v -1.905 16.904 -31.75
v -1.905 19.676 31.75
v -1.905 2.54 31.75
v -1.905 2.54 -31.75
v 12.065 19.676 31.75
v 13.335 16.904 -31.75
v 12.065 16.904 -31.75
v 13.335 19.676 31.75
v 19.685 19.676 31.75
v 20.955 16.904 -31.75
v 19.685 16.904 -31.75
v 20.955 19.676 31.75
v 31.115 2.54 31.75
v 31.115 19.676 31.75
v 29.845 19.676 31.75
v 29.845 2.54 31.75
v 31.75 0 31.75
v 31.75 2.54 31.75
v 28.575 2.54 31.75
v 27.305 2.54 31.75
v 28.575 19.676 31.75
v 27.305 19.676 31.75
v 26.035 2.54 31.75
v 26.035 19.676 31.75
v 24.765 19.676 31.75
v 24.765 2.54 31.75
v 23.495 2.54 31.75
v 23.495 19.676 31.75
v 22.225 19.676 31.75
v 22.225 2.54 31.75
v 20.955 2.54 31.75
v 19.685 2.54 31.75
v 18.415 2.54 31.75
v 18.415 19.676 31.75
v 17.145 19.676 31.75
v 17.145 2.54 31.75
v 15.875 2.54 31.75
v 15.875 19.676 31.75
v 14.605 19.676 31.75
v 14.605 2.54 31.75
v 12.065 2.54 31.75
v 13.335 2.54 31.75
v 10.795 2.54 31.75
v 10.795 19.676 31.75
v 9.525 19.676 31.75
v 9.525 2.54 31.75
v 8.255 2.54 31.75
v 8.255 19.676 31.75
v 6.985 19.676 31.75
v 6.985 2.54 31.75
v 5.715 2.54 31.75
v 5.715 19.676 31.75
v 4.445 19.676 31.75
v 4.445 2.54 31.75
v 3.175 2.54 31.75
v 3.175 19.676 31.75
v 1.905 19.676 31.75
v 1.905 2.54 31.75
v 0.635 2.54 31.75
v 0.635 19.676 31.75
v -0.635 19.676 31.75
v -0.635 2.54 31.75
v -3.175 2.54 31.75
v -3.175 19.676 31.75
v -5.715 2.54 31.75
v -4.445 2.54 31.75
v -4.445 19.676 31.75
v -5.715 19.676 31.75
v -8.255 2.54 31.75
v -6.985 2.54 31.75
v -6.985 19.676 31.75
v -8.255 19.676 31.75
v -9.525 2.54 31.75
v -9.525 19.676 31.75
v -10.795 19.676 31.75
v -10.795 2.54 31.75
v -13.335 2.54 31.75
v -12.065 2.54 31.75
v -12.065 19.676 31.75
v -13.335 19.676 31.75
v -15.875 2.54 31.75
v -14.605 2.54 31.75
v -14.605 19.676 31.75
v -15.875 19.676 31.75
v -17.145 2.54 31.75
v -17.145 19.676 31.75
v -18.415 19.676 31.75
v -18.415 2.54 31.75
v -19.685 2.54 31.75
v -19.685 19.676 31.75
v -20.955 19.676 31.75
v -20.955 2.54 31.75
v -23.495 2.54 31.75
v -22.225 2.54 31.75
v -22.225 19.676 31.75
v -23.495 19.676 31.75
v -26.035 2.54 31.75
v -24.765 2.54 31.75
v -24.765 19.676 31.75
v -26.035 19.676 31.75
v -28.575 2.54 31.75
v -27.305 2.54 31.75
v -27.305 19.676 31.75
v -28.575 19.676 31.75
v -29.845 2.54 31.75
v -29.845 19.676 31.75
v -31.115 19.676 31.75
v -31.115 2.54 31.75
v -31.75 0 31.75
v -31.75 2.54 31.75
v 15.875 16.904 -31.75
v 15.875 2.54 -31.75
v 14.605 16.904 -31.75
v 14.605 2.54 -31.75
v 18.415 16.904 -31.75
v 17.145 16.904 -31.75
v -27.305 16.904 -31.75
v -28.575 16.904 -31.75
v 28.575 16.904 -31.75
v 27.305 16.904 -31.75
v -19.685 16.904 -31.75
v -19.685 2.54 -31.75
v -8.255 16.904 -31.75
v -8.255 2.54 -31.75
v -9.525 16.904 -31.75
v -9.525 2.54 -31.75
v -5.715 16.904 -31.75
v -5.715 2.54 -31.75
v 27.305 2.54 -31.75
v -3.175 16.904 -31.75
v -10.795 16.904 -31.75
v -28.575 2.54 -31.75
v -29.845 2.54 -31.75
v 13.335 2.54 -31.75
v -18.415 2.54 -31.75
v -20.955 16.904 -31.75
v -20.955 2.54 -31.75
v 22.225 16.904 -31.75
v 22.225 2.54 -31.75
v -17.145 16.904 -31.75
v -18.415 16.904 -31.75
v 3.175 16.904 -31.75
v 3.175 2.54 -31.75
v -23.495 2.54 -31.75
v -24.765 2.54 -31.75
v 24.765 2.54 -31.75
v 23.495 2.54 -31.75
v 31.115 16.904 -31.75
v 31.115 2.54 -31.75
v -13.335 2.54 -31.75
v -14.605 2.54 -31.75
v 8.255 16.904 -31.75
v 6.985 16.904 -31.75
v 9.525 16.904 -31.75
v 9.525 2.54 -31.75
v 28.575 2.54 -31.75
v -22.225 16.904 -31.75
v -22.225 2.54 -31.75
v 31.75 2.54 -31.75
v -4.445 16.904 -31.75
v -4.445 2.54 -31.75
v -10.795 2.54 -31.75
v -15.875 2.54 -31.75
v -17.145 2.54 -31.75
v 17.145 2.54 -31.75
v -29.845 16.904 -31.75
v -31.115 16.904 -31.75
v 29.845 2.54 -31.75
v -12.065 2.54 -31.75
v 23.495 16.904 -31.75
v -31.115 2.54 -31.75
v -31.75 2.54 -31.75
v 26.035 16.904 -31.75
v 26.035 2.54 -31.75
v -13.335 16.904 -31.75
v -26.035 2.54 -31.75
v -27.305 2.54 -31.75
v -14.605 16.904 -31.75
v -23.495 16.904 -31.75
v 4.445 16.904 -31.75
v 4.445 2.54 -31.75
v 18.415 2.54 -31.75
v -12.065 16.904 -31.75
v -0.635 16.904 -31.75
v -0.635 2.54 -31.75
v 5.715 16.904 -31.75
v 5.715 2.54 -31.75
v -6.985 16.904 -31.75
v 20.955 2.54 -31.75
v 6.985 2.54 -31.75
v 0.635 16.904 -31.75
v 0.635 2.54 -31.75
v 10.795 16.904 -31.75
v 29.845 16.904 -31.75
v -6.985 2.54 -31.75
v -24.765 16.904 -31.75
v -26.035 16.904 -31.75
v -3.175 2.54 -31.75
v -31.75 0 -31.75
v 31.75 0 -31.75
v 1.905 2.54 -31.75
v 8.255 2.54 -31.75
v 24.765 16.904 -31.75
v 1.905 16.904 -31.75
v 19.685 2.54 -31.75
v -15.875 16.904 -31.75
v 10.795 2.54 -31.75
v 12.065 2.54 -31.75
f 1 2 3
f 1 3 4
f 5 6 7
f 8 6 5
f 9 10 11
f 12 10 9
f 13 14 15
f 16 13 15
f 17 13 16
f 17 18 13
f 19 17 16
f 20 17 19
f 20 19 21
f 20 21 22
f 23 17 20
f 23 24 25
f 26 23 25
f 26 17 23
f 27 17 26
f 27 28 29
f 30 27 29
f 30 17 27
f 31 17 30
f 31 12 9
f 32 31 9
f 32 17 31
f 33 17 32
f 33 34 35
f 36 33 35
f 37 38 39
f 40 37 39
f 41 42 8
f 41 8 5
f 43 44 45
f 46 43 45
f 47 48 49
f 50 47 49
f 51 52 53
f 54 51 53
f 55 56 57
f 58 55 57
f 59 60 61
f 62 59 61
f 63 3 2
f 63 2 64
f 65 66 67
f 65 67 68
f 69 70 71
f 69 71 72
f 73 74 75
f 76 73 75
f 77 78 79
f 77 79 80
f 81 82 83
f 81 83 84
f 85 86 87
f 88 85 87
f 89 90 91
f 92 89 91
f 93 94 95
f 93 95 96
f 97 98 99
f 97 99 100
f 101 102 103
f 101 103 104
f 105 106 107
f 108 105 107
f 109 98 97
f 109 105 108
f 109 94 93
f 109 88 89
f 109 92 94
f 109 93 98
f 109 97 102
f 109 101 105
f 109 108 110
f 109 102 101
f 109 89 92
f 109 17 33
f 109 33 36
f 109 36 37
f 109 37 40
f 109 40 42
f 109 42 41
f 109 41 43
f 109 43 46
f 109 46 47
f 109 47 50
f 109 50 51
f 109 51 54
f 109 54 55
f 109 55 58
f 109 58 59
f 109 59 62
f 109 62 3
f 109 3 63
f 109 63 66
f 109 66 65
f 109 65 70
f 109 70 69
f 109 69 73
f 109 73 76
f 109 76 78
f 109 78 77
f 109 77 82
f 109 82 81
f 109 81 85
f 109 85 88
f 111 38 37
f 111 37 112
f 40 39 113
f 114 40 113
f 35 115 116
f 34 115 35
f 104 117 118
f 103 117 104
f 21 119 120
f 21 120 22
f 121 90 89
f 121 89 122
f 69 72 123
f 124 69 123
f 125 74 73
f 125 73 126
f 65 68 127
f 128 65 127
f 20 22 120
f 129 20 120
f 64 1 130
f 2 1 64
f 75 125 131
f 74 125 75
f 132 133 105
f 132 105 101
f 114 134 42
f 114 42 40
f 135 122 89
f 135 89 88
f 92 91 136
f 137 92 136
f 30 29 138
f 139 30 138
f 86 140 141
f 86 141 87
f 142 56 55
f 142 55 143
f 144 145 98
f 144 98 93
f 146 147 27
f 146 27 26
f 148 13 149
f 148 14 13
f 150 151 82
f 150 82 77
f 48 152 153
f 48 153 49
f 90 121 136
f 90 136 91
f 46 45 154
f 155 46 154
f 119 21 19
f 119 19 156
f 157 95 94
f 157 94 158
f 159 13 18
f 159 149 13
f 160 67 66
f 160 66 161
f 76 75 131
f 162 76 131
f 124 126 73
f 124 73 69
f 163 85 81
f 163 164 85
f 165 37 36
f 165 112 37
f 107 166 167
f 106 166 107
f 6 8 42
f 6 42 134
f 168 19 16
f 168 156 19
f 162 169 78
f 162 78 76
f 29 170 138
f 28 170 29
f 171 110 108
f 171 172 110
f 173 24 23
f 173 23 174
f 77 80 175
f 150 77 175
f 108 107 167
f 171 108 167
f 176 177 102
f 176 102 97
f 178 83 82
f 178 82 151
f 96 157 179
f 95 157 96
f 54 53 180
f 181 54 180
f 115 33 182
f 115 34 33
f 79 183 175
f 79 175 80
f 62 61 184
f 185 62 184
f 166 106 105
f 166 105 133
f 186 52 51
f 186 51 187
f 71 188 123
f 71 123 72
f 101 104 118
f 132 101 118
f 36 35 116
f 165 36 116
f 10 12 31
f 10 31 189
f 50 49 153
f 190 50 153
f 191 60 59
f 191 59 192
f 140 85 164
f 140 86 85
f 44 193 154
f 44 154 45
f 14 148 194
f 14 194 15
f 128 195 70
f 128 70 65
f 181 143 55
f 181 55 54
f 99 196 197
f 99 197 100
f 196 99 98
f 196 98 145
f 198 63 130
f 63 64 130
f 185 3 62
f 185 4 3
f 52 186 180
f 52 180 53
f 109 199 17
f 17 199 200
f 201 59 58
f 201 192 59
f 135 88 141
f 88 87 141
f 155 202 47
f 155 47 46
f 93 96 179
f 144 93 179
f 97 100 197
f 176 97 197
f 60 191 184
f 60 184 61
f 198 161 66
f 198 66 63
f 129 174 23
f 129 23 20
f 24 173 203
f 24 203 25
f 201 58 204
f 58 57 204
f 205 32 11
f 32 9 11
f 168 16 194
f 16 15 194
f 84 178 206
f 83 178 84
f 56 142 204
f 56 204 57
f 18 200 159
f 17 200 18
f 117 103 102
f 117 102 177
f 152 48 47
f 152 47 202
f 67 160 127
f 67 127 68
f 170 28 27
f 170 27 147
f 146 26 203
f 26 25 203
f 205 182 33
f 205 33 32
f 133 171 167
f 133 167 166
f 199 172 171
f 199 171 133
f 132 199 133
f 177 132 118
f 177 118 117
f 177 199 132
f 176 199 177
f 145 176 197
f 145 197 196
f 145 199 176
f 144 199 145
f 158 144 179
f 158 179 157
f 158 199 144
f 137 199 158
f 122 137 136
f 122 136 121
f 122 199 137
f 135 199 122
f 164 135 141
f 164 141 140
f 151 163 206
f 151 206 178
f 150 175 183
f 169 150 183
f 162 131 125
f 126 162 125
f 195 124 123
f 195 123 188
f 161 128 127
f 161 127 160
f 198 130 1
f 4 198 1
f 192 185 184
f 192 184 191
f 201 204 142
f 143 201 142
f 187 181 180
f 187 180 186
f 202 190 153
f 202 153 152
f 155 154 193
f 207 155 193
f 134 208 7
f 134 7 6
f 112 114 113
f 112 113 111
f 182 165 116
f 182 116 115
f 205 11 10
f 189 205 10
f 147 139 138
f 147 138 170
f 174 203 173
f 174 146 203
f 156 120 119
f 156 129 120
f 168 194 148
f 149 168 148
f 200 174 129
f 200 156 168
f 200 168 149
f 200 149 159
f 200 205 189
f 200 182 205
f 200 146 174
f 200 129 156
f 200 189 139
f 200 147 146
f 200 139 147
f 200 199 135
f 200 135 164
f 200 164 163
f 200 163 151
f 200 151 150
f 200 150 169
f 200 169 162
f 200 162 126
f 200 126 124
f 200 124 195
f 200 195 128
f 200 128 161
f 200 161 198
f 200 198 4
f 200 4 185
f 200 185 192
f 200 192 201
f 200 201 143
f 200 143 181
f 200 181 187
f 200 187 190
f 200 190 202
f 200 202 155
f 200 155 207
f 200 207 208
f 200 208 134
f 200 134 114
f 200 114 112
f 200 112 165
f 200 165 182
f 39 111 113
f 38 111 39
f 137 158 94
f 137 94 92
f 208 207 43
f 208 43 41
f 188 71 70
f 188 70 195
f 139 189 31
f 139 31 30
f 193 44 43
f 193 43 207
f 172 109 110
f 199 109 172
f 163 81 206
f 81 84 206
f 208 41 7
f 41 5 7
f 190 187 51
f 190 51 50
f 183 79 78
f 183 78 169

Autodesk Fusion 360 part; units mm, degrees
sketch "Sketch1" plane through (0, 0, 0) normal (0, 1, 0) x (1, 0, 0)
  line L0 (31.75, -31.75) -> (-31.75, -31.75)
  line L1 (-31.75, -31.75) -> (-31.75, 31.75)
  line L2 (-31.75, 31.75) -> (31.75, 31.75)
  line L3 (31.75, 31.75) -> (31.75, -31.75)
  line L4 (31.75, -31.75) -> (-31.75, 31.75) construction
  line L5 (-31.75, -31.75) -> (31.75, 31.75) construction
  dimension "d1" = 63.5
  dimension "d2" = 63.5
extrude "Extrude1" add sketch "Sketch1" along normal blind 2.54 makes body 1
sketch "Sketch2" plane through (0, 2.54, 0) normal (0, 1, 0) x (-1, 0, 0)
  line L0 (-31.75, -31.75) -> (31.75, -31.75)
  line L1 (31.75, -31.75) -> (31.75, 31.75)
  line L2 (31.75, 31.75) -> (-31.75, 31.75)
  line L3 (-31.75, 31.75) -> (-31.75, -31.75)
  line L4 (0.635, 31.75) -> (-0.635, 31.75)
  line L5 (-0.635, 31.75) -> (-0.635, -31.75)
  line L6 (-0.635, -31.75) -> (0.635, -31.75)
  line L7 (0.635, -31.75) -> (0.635, 31.75)
  line L8 (0.635, 31.75) -> (-0.635, -31.75) construction
  line L9 (-0.635, 31.75) -> (0.635, -31.75) construction
  dimension "d5" = 1.27
  dimension "d6" = 63.5
ref_plane "WorkPlane1" through (0.635, 0, 0) normal (1, 0, 0) x (0, 1, 0)
sketch "Fin Shape" plane through (0.635, 0, 0) normal (1, 0, 0) x (0, 0, -1)
  line L0 (31.75, 2.54) -> (-31.75, 2.54)
  line L1 (-31.75, 2.54) -> (-31.75, 16.9038)
  line L2 (-31.75, 16.9038) -> (31.75, 16.9038)
  line L3 (31.75, 16.9038) -> (31.75, 2.54)
  line L4 (31.75, 16.9038) -> (-31.75, 19.6763)
  line L5 (-31.75, 19.6763) -> (-31.75, 16.9038)
  dimension "d14" = 63.5
  dimension "d15" = 14.3638
  dimension "d18" = 2.7725
extrude "Extrude3" add sketch "Fin Shape" against normal blind 1.27 separate body makes body 2
pattern_linear "R-Pattern1" count 25 spacing 2.54 along (1, 0, 0) both ways of bodies 2 makes body 3 at (-29.845, 13.04, 10.5833) makes body 4 at (-27.305, 13.04, 10.5833) makes body 5 at (-24.765, 13.04, 10.5833) makes body 6 at (-22.225, 13.04, 10.5833) makes body 7 at (-19.685, 13.04, 10.5833) makes body 8 at (-17.145, 13.04, 10.5833) makes body 9 at (-14.605, 13.04, 10.5833) makes body 10 at (-12.065, 13.04, 10.5833) makes body 11 at (-9.525, 13.04, 10.5833) makes body 12 at (-6.985, 13.04, 10.5833) makes body 13 at (-4.445, 13.04, 10.5833) makes body 14 at (-1.905, 13.04, 10.5833) makes body 15 at (3.175, 13.04, 10.5833) makes body 16 at (5.715, 13.04, 10.5833) makes body 17 at (8.255, 13.04, 10.5833) makes body 18 at (10.795, 13.04, 10.5833) makes body 19 at (13.335, 13.04, 10.5833) makes body 20 at (15.875, 13.04, 10.5833) makes body 21 at (18.415, 13.04, 10.5833) makes body 22 at (20.955, 13.04, 10.5833) makes body 23 at (23.495, 13.04, 10.5833) makes body 24 at (26.035, 13.04, 10.5833) makes body 25 at (28.575, 13.04, 10.5833) makes body 26 at (31.115, 13.04, 10.5833)
combine "Combine2" operation add target body 1 tool bodies 2 4 25 3 26 19 13 10 11 12 17 20 21 7 9 8 24 23 22 6 5 15 14 16 18
equation "d11 = 1.27 * 2 mm"
